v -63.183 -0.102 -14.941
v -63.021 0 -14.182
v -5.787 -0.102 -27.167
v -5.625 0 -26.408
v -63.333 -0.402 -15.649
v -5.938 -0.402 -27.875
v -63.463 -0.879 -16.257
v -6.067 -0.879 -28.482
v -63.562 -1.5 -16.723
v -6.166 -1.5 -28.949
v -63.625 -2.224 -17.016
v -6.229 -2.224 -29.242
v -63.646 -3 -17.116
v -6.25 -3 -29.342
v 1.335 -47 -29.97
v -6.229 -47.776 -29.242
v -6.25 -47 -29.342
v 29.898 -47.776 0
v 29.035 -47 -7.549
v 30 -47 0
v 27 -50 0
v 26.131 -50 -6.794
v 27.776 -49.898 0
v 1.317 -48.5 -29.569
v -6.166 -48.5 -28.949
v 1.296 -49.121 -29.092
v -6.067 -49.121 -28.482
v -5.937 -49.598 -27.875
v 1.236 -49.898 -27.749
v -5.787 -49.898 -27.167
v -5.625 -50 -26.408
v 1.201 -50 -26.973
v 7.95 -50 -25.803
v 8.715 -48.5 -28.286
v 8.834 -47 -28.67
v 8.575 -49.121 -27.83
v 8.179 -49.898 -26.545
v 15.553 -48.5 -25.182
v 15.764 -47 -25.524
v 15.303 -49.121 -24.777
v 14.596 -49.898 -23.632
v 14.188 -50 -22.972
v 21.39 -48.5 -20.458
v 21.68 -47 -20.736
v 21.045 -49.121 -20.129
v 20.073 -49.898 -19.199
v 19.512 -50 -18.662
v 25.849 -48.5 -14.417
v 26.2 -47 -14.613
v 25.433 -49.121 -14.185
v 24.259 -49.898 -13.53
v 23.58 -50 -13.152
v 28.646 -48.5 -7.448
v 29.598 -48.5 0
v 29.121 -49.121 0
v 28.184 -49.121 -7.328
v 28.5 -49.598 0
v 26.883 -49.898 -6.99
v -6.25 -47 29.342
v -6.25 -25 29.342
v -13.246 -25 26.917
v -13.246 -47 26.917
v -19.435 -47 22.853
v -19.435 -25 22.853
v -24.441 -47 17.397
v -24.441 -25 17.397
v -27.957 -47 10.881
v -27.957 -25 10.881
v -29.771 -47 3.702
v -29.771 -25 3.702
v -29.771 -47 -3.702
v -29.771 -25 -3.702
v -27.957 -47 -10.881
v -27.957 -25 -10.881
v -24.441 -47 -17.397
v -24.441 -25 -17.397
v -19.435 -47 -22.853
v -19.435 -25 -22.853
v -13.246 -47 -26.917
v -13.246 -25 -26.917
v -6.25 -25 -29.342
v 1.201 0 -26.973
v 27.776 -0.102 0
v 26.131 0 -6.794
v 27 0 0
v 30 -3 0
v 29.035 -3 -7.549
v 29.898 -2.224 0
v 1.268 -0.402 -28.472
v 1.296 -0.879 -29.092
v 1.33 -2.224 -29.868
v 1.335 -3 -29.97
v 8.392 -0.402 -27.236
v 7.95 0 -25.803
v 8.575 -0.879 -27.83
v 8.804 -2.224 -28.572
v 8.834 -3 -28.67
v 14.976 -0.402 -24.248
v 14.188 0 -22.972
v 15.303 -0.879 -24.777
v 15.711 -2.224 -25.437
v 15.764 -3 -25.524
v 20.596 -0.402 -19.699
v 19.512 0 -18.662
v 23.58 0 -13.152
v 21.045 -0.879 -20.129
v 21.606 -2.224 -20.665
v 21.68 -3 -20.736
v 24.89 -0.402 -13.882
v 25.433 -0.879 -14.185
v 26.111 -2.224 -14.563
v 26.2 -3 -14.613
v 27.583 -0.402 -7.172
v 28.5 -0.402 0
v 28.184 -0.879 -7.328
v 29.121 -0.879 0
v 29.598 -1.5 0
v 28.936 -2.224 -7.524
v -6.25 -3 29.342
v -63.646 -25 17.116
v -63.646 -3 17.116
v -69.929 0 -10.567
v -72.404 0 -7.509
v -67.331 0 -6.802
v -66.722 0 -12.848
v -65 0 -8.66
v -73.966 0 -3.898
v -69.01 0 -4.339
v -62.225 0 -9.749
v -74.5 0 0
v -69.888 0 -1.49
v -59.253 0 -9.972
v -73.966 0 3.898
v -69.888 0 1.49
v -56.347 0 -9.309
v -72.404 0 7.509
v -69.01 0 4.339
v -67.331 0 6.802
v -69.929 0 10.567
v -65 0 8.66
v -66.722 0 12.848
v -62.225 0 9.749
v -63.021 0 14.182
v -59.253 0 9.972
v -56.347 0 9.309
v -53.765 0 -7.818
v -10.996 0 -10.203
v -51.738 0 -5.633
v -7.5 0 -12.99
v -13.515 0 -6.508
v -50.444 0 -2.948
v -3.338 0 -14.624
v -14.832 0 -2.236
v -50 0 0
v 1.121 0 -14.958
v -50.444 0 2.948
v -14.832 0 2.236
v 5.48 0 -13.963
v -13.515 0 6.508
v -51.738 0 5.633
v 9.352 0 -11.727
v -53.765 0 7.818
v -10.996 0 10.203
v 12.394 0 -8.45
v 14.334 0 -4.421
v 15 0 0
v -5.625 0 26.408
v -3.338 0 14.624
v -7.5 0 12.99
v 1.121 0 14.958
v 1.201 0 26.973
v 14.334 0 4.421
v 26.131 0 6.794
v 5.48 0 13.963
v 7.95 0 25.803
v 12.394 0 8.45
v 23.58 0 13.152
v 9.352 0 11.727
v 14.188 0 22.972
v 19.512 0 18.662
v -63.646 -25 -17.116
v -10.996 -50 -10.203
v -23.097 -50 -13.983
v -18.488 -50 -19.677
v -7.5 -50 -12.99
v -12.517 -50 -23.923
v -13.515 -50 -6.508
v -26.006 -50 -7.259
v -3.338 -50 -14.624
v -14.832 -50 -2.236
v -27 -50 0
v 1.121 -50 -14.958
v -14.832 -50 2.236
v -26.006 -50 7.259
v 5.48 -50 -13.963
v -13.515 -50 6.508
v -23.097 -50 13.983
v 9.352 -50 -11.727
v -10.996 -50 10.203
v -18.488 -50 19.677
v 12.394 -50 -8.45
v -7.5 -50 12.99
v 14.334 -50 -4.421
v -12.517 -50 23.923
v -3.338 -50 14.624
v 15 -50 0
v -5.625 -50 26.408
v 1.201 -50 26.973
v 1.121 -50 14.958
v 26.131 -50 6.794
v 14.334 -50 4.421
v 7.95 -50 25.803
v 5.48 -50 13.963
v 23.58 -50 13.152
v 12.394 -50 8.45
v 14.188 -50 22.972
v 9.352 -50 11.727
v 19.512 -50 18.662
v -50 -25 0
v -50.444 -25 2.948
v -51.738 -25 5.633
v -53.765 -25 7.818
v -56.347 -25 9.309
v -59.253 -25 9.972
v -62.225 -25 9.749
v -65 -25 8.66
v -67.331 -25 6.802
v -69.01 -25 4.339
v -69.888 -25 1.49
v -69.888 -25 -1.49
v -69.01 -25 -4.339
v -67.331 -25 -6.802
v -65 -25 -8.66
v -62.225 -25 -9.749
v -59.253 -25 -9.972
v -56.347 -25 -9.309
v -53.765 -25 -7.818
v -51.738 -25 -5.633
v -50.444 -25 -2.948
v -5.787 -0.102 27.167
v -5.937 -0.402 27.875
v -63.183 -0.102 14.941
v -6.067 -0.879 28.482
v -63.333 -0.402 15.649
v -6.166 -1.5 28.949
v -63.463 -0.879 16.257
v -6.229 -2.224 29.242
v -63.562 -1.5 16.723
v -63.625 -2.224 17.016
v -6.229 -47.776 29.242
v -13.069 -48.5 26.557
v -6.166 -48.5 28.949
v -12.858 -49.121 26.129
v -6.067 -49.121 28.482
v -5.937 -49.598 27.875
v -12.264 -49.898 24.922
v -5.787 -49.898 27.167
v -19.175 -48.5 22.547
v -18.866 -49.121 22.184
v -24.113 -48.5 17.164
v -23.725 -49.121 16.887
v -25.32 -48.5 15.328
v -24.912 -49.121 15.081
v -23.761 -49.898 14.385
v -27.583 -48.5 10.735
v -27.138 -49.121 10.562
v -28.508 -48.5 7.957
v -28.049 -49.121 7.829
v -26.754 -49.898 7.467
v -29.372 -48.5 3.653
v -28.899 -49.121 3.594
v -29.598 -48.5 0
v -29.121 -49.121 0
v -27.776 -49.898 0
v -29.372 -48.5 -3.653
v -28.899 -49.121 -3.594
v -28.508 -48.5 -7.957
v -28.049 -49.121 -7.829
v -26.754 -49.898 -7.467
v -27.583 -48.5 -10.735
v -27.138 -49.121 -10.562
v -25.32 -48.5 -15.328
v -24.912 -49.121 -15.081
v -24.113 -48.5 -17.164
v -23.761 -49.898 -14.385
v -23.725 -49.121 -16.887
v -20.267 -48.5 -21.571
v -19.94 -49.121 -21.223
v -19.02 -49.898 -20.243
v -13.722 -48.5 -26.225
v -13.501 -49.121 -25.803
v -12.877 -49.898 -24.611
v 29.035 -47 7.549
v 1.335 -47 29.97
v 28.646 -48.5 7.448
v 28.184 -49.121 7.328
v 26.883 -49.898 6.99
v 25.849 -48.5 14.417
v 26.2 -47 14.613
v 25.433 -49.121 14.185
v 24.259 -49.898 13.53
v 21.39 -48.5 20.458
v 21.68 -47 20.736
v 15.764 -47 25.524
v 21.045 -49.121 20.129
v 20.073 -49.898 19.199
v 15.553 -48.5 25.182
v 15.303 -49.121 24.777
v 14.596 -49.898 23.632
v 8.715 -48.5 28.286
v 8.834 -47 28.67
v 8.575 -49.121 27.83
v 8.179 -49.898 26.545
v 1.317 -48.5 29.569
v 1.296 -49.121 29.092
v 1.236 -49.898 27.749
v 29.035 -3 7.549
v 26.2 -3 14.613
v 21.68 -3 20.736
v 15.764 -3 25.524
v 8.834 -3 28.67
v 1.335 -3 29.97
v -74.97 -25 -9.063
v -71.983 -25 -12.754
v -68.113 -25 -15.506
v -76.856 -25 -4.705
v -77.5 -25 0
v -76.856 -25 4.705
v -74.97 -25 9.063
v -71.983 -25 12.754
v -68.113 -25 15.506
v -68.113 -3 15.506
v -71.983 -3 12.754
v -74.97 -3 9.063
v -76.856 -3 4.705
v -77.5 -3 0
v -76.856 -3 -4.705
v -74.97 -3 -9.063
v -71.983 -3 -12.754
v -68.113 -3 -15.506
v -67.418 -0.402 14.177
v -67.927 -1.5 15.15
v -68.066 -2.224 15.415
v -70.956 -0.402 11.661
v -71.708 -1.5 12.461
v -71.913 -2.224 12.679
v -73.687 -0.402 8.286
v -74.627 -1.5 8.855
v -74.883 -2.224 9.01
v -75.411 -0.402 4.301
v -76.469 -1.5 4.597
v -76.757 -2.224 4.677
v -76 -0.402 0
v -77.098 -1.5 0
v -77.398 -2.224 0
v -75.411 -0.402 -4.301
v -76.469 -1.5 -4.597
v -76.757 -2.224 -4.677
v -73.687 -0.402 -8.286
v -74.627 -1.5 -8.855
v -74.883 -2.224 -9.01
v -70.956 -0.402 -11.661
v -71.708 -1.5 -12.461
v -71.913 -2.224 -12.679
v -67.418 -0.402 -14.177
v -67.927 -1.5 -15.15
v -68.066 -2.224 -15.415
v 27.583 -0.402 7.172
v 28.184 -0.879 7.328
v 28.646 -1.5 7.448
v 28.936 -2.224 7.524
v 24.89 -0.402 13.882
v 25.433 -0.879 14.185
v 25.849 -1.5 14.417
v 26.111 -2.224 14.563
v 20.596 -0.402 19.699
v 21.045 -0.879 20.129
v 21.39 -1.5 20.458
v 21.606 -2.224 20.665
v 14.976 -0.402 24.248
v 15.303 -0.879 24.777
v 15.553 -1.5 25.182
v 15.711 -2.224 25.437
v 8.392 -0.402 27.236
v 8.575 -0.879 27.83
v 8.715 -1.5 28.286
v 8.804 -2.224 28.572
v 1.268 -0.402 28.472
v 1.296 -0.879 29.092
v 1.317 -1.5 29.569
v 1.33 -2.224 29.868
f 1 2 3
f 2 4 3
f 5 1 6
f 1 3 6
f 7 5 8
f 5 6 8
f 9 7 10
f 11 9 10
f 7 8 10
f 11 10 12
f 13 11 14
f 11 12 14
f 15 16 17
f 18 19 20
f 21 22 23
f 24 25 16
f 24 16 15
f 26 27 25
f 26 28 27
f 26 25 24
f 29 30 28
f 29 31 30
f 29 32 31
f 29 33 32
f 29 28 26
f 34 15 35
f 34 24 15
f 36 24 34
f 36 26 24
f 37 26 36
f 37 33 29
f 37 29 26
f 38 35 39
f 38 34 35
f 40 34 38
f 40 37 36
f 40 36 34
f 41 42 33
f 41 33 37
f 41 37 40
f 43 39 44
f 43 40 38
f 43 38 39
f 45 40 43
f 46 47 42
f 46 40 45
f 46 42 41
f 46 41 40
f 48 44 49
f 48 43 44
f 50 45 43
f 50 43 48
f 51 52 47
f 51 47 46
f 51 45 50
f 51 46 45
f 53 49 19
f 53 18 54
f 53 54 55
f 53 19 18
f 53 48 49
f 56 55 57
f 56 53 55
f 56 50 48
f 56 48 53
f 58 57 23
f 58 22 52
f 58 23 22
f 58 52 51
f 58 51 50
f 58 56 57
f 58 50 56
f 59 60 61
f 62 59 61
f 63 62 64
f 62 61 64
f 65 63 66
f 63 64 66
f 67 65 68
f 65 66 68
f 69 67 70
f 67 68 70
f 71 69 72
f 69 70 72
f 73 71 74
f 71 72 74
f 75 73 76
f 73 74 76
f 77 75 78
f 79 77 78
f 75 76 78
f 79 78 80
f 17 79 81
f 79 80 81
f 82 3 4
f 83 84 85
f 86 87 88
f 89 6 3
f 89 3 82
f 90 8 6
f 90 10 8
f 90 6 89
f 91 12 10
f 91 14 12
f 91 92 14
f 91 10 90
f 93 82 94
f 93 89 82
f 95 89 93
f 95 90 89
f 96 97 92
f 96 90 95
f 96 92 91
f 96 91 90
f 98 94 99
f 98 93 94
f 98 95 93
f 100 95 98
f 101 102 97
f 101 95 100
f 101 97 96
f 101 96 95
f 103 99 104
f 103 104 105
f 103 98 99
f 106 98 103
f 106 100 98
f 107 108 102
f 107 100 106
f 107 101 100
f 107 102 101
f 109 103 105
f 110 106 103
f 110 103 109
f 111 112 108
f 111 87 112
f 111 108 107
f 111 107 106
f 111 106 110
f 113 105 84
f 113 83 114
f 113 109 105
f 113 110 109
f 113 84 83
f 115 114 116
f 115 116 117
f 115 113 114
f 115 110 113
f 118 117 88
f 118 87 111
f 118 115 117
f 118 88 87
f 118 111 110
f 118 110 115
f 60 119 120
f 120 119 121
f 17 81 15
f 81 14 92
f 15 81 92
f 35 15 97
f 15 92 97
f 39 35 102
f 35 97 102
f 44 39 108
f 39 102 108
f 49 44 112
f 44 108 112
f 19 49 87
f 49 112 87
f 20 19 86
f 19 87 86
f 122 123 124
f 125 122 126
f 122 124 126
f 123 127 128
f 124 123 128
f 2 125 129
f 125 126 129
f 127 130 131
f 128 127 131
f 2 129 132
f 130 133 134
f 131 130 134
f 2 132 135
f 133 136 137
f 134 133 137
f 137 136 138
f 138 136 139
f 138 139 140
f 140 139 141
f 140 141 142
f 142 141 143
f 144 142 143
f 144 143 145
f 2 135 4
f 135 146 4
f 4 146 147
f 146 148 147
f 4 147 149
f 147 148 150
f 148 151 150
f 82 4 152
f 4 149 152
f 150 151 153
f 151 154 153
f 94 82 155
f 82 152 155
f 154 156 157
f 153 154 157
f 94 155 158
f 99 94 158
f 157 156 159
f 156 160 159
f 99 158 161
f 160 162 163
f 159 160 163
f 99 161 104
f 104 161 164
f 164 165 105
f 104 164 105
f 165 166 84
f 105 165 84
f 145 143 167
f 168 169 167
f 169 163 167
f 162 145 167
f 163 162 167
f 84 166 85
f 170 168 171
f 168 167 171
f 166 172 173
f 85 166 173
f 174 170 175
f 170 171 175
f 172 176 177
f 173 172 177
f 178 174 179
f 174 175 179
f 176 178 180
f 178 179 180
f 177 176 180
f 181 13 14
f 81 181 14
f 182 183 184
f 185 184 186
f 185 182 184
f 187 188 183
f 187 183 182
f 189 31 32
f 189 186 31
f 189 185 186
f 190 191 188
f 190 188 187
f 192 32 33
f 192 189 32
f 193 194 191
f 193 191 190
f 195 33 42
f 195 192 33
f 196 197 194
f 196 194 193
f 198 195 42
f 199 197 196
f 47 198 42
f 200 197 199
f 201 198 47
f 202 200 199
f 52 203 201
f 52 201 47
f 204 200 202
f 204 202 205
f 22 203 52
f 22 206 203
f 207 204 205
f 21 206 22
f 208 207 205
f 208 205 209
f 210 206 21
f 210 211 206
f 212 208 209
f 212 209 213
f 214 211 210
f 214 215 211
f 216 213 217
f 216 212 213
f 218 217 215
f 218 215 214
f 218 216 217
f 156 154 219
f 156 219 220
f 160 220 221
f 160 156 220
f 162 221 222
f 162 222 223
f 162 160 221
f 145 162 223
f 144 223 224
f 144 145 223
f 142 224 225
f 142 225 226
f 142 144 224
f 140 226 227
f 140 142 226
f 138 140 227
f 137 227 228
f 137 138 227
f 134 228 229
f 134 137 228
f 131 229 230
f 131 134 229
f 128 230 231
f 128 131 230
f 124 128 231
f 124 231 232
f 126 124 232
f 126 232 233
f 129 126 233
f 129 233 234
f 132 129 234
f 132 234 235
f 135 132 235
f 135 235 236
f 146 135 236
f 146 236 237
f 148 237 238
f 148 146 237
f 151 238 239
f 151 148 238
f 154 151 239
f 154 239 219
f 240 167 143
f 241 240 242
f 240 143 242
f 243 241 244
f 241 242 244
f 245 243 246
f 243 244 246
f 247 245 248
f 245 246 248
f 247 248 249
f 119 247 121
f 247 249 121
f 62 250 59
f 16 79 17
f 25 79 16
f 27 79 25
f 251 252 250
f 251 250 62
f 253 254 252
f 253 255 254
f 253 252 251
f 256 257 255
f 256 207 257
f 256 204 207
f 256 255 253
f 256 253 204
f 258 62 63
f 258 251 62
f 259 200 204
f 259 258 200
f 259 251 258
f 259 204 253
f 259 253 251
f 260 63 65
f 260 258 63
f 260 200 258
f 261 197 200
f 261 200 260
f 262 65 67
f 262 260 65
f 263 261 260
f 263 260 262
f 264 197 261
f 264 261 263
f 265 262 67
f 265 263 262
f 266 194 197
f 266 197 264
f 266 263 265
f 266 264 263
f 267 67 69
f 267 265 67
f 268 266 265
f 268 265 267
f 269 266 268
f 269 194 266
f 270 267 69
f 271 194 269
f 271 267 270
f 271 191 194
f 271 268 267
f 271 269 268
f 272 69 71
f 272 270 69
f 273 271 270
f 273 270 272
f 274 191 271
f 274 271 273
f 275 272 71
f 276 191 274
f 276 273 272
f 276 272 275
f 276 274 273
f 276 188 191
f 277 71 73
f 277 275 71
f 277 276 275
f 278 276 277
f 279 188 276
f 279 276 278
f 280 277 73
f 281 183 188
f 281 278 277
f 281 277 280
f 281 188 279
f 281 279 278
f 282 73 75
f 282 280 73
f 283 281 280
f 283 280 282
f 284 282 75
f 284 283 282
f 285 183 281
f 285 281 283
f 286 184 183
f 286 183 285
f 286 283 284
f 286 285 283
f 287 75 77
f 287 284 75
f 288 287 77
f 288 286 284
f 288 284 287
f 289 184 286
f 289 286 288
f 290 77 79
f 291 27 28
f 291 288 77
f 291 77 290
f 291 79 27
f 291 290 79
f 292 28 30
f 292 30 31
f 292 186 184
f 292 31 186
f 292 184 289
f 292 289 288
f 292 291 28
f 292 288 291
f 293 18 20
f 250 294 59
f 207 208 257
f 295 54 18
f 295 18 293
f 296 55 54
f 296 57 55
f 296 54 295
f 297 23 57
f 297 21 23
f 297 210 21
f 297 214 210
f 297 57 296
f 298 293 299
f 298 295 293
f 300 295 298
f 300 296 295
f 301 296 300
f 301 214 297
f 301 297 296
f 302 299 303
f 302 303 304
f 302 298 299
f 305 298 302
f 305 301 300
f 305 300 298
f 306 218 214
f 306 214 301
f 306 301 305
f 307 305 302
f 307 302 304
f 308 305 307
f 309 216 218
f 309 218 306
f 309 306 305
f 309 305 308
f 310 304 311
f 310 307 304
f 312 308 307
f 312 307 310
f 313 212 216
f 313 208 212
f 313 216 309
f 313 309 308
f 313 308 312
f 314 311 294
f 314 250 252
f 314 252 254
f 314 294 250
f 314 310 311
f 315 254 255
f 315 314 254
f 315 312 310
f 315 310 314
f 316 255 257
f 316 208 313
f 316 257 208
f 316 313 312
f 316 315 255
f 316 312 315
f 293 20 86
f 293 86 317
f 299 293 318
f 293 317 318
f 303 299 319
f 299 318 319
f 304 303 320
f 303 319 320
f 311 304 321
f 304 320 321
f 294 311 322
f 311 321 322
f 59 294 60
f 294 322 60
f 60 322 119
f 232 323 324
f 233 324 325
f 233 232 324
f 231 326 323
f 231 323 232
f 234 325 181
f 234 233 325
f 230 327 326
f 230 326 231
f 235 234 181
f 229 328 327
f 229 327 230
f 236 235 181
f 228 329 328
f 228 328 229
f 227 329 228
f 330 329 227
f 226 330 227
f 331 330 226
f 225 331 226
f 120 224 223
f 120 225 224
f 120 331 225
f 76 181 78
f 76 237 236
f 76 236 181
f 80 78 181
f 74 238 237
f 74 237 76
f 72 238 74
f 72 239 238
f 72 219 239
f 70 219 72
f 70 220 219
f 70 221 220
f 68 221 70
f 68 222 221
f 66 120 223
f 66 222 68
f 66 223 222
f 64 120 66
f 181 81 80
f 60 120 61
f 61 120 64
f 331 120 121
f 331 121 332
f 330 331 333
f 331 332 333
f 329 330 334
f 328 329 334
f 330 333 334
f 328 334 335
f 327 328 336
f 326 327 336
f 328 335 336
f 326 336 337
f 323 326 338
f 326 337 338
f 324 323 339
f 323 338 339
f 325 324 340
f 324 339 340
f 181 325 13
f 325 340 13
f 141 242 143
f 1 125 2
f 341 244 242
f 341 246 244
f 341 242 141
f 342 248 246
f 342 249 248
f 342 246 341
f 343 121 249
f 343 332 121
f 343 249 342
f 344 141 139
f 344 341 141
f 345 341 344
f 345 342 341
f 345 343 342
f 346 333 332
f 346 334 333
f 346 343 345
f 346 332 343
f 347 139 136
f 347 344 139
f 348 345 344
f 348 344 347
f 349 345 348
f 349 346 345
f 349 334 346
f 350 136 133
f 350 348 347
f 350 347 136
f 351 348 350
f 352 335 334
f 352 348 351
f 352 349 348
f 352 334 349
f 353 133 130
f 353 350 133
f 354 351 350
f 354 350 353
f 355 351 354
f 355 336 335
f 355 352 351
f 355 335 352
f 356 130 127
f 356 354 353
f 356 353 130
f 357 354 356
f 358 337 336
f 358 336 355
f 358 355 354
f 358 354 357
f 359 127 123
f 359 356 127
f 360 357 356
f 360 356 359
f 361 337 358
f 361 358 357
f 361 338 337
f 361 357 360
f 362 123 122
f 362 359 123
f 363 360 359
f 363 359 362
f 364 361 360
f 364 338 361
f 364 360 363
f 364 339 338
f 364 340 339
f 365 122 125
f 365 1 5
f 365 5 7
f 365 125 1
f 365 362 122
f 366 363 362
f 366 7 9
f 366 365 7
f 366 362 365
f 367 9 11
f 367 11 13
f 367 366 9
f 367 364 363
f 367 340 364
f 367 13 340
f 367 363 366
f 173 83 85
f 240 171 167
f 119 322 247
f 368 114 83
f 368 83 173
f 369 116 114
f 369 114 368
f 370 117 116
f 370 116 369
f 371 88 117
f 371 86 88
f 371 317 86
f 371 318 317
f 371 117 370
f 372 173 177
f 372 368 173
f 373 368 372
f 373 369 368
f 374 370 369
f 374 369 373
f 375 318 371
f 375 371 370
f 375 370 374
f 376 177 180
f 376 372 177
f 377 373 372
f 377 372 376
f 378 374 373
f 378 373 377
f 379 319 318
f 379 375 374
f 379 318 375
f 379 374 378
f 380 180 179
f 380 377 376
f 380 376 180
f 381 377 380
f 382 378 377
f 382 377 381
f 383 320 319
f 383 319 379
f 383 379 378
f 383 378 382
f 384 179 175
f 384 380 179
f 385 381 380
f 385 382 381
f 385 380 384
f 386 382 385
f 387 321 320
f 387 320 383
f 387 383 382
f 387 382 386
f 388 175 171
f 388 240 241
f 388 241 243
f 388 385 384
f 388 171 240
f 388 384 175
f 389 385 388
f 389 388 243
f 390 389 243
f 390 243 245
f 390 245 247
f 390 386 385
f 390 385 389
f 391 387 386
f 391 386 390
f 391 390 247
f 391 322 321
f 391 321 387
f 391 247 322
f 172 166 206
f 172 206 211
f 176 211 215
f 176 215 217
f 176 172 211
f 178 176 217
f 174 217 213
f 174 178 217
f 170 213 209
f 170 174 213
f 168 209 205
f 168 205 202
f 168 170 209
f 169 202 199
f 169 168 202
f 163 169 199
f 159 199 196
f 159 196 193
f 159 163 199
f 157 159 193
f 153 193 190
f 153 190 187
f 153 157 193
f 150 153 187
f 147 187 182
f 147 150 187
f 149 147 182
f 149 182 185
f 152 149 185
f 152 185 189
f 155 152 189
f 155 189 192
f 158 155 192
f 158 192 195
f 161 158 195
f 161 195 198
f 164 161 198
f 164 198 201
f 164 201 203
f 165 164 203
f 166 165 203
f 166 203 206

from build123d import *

# Parameters (mm, degrees)
F0_R     = 15
F0_R_2   = 10
F1_DEPTH = 25
F2_DEPTH = 50
F3_R     = 3


with BuildPart() as f1:
    # F0 (on Front) → F1 (new body)
    with BuildSketch(Plane.XZ):
        with BuildLine():
            ThreePointArc((-6.25, -29.341736), (18.874586, -23.318448), (30, 0))
            ThreePointArc((30, 0), (18.874586, 23.318448), (-6.25, 29.341736))
            ThreePointArc((-6.25, 29.341736), (-30, 0), (-6.25, -29.341736))
        make_face()
        Circle(F0_R, mode=Mode.SUBTRACT)
        with BuildLine():
            ThreePointArc((-6.25, -29.341736), (-30, 0), (-6.25, 29.341736))
            Line((-6.25, 29.341736), (-63.645833, 17.116013))
            ThreePointArc((-63.645833, 17.116013), (-48.989825, 13.602428), (-42.5, 0))
            ThreePointArc((-42.5, 0), (-48.989825, -13.602428), (-63.645833, -17.116013))
            Line((-63.645833, -17.116013), (-6.25, -29.341736))
        make_face()
        with BuildLine():
            ThreePointArc((-42.5, 0), (-48.989825, 13.602428), (-63.645833, 17.116013))
            ThreePointArc((-63.645833, 17.116013), (-77.5, 0), (-63.645833, -17.116013))
            ThreePointArc((-63.645833, -17.116013), (-48.989825, -13.602428), (-42.5, 0))
        make_face()
        with Locations((-60, 0)):
            Circle(F0_R_2, mode=Mode.SUBTRACT)
    extrude(amount=F1_DEPTH)

    # F0 (on Front) → F2 (join)
    with BuildSketch(Plane.XZ):
        with BuildLine():
            ThreePointArc((-6.25, -29.341736), (18.874586, -23.318448), (30, 0))
            ThreePointArc((30, 0), (18.874586, 23.318448), (-6.25, 29.341736))
            ThreePointArc((-6.25, 29.341736), (-30, 0), (-6.25, -29.341736))
        make_face()
        Circle(F0_R, mode=Mode.SUBTRACT)
    extrude(amount=F2_DEPTH)

    # F3
    f3_edges = [f1.edges().sort_by_distance(p)[0] for p in [
        (6.25, -50, -29.341736),
        (30, 0, 0),
        (-34.947917, 0, -23.228875),
        (-77.5, 0, 0),
        (-34.947917, 0, 23.228875),
    ]]
    fillet(f3_edges, radius=F3_R)


solid = f1.part
